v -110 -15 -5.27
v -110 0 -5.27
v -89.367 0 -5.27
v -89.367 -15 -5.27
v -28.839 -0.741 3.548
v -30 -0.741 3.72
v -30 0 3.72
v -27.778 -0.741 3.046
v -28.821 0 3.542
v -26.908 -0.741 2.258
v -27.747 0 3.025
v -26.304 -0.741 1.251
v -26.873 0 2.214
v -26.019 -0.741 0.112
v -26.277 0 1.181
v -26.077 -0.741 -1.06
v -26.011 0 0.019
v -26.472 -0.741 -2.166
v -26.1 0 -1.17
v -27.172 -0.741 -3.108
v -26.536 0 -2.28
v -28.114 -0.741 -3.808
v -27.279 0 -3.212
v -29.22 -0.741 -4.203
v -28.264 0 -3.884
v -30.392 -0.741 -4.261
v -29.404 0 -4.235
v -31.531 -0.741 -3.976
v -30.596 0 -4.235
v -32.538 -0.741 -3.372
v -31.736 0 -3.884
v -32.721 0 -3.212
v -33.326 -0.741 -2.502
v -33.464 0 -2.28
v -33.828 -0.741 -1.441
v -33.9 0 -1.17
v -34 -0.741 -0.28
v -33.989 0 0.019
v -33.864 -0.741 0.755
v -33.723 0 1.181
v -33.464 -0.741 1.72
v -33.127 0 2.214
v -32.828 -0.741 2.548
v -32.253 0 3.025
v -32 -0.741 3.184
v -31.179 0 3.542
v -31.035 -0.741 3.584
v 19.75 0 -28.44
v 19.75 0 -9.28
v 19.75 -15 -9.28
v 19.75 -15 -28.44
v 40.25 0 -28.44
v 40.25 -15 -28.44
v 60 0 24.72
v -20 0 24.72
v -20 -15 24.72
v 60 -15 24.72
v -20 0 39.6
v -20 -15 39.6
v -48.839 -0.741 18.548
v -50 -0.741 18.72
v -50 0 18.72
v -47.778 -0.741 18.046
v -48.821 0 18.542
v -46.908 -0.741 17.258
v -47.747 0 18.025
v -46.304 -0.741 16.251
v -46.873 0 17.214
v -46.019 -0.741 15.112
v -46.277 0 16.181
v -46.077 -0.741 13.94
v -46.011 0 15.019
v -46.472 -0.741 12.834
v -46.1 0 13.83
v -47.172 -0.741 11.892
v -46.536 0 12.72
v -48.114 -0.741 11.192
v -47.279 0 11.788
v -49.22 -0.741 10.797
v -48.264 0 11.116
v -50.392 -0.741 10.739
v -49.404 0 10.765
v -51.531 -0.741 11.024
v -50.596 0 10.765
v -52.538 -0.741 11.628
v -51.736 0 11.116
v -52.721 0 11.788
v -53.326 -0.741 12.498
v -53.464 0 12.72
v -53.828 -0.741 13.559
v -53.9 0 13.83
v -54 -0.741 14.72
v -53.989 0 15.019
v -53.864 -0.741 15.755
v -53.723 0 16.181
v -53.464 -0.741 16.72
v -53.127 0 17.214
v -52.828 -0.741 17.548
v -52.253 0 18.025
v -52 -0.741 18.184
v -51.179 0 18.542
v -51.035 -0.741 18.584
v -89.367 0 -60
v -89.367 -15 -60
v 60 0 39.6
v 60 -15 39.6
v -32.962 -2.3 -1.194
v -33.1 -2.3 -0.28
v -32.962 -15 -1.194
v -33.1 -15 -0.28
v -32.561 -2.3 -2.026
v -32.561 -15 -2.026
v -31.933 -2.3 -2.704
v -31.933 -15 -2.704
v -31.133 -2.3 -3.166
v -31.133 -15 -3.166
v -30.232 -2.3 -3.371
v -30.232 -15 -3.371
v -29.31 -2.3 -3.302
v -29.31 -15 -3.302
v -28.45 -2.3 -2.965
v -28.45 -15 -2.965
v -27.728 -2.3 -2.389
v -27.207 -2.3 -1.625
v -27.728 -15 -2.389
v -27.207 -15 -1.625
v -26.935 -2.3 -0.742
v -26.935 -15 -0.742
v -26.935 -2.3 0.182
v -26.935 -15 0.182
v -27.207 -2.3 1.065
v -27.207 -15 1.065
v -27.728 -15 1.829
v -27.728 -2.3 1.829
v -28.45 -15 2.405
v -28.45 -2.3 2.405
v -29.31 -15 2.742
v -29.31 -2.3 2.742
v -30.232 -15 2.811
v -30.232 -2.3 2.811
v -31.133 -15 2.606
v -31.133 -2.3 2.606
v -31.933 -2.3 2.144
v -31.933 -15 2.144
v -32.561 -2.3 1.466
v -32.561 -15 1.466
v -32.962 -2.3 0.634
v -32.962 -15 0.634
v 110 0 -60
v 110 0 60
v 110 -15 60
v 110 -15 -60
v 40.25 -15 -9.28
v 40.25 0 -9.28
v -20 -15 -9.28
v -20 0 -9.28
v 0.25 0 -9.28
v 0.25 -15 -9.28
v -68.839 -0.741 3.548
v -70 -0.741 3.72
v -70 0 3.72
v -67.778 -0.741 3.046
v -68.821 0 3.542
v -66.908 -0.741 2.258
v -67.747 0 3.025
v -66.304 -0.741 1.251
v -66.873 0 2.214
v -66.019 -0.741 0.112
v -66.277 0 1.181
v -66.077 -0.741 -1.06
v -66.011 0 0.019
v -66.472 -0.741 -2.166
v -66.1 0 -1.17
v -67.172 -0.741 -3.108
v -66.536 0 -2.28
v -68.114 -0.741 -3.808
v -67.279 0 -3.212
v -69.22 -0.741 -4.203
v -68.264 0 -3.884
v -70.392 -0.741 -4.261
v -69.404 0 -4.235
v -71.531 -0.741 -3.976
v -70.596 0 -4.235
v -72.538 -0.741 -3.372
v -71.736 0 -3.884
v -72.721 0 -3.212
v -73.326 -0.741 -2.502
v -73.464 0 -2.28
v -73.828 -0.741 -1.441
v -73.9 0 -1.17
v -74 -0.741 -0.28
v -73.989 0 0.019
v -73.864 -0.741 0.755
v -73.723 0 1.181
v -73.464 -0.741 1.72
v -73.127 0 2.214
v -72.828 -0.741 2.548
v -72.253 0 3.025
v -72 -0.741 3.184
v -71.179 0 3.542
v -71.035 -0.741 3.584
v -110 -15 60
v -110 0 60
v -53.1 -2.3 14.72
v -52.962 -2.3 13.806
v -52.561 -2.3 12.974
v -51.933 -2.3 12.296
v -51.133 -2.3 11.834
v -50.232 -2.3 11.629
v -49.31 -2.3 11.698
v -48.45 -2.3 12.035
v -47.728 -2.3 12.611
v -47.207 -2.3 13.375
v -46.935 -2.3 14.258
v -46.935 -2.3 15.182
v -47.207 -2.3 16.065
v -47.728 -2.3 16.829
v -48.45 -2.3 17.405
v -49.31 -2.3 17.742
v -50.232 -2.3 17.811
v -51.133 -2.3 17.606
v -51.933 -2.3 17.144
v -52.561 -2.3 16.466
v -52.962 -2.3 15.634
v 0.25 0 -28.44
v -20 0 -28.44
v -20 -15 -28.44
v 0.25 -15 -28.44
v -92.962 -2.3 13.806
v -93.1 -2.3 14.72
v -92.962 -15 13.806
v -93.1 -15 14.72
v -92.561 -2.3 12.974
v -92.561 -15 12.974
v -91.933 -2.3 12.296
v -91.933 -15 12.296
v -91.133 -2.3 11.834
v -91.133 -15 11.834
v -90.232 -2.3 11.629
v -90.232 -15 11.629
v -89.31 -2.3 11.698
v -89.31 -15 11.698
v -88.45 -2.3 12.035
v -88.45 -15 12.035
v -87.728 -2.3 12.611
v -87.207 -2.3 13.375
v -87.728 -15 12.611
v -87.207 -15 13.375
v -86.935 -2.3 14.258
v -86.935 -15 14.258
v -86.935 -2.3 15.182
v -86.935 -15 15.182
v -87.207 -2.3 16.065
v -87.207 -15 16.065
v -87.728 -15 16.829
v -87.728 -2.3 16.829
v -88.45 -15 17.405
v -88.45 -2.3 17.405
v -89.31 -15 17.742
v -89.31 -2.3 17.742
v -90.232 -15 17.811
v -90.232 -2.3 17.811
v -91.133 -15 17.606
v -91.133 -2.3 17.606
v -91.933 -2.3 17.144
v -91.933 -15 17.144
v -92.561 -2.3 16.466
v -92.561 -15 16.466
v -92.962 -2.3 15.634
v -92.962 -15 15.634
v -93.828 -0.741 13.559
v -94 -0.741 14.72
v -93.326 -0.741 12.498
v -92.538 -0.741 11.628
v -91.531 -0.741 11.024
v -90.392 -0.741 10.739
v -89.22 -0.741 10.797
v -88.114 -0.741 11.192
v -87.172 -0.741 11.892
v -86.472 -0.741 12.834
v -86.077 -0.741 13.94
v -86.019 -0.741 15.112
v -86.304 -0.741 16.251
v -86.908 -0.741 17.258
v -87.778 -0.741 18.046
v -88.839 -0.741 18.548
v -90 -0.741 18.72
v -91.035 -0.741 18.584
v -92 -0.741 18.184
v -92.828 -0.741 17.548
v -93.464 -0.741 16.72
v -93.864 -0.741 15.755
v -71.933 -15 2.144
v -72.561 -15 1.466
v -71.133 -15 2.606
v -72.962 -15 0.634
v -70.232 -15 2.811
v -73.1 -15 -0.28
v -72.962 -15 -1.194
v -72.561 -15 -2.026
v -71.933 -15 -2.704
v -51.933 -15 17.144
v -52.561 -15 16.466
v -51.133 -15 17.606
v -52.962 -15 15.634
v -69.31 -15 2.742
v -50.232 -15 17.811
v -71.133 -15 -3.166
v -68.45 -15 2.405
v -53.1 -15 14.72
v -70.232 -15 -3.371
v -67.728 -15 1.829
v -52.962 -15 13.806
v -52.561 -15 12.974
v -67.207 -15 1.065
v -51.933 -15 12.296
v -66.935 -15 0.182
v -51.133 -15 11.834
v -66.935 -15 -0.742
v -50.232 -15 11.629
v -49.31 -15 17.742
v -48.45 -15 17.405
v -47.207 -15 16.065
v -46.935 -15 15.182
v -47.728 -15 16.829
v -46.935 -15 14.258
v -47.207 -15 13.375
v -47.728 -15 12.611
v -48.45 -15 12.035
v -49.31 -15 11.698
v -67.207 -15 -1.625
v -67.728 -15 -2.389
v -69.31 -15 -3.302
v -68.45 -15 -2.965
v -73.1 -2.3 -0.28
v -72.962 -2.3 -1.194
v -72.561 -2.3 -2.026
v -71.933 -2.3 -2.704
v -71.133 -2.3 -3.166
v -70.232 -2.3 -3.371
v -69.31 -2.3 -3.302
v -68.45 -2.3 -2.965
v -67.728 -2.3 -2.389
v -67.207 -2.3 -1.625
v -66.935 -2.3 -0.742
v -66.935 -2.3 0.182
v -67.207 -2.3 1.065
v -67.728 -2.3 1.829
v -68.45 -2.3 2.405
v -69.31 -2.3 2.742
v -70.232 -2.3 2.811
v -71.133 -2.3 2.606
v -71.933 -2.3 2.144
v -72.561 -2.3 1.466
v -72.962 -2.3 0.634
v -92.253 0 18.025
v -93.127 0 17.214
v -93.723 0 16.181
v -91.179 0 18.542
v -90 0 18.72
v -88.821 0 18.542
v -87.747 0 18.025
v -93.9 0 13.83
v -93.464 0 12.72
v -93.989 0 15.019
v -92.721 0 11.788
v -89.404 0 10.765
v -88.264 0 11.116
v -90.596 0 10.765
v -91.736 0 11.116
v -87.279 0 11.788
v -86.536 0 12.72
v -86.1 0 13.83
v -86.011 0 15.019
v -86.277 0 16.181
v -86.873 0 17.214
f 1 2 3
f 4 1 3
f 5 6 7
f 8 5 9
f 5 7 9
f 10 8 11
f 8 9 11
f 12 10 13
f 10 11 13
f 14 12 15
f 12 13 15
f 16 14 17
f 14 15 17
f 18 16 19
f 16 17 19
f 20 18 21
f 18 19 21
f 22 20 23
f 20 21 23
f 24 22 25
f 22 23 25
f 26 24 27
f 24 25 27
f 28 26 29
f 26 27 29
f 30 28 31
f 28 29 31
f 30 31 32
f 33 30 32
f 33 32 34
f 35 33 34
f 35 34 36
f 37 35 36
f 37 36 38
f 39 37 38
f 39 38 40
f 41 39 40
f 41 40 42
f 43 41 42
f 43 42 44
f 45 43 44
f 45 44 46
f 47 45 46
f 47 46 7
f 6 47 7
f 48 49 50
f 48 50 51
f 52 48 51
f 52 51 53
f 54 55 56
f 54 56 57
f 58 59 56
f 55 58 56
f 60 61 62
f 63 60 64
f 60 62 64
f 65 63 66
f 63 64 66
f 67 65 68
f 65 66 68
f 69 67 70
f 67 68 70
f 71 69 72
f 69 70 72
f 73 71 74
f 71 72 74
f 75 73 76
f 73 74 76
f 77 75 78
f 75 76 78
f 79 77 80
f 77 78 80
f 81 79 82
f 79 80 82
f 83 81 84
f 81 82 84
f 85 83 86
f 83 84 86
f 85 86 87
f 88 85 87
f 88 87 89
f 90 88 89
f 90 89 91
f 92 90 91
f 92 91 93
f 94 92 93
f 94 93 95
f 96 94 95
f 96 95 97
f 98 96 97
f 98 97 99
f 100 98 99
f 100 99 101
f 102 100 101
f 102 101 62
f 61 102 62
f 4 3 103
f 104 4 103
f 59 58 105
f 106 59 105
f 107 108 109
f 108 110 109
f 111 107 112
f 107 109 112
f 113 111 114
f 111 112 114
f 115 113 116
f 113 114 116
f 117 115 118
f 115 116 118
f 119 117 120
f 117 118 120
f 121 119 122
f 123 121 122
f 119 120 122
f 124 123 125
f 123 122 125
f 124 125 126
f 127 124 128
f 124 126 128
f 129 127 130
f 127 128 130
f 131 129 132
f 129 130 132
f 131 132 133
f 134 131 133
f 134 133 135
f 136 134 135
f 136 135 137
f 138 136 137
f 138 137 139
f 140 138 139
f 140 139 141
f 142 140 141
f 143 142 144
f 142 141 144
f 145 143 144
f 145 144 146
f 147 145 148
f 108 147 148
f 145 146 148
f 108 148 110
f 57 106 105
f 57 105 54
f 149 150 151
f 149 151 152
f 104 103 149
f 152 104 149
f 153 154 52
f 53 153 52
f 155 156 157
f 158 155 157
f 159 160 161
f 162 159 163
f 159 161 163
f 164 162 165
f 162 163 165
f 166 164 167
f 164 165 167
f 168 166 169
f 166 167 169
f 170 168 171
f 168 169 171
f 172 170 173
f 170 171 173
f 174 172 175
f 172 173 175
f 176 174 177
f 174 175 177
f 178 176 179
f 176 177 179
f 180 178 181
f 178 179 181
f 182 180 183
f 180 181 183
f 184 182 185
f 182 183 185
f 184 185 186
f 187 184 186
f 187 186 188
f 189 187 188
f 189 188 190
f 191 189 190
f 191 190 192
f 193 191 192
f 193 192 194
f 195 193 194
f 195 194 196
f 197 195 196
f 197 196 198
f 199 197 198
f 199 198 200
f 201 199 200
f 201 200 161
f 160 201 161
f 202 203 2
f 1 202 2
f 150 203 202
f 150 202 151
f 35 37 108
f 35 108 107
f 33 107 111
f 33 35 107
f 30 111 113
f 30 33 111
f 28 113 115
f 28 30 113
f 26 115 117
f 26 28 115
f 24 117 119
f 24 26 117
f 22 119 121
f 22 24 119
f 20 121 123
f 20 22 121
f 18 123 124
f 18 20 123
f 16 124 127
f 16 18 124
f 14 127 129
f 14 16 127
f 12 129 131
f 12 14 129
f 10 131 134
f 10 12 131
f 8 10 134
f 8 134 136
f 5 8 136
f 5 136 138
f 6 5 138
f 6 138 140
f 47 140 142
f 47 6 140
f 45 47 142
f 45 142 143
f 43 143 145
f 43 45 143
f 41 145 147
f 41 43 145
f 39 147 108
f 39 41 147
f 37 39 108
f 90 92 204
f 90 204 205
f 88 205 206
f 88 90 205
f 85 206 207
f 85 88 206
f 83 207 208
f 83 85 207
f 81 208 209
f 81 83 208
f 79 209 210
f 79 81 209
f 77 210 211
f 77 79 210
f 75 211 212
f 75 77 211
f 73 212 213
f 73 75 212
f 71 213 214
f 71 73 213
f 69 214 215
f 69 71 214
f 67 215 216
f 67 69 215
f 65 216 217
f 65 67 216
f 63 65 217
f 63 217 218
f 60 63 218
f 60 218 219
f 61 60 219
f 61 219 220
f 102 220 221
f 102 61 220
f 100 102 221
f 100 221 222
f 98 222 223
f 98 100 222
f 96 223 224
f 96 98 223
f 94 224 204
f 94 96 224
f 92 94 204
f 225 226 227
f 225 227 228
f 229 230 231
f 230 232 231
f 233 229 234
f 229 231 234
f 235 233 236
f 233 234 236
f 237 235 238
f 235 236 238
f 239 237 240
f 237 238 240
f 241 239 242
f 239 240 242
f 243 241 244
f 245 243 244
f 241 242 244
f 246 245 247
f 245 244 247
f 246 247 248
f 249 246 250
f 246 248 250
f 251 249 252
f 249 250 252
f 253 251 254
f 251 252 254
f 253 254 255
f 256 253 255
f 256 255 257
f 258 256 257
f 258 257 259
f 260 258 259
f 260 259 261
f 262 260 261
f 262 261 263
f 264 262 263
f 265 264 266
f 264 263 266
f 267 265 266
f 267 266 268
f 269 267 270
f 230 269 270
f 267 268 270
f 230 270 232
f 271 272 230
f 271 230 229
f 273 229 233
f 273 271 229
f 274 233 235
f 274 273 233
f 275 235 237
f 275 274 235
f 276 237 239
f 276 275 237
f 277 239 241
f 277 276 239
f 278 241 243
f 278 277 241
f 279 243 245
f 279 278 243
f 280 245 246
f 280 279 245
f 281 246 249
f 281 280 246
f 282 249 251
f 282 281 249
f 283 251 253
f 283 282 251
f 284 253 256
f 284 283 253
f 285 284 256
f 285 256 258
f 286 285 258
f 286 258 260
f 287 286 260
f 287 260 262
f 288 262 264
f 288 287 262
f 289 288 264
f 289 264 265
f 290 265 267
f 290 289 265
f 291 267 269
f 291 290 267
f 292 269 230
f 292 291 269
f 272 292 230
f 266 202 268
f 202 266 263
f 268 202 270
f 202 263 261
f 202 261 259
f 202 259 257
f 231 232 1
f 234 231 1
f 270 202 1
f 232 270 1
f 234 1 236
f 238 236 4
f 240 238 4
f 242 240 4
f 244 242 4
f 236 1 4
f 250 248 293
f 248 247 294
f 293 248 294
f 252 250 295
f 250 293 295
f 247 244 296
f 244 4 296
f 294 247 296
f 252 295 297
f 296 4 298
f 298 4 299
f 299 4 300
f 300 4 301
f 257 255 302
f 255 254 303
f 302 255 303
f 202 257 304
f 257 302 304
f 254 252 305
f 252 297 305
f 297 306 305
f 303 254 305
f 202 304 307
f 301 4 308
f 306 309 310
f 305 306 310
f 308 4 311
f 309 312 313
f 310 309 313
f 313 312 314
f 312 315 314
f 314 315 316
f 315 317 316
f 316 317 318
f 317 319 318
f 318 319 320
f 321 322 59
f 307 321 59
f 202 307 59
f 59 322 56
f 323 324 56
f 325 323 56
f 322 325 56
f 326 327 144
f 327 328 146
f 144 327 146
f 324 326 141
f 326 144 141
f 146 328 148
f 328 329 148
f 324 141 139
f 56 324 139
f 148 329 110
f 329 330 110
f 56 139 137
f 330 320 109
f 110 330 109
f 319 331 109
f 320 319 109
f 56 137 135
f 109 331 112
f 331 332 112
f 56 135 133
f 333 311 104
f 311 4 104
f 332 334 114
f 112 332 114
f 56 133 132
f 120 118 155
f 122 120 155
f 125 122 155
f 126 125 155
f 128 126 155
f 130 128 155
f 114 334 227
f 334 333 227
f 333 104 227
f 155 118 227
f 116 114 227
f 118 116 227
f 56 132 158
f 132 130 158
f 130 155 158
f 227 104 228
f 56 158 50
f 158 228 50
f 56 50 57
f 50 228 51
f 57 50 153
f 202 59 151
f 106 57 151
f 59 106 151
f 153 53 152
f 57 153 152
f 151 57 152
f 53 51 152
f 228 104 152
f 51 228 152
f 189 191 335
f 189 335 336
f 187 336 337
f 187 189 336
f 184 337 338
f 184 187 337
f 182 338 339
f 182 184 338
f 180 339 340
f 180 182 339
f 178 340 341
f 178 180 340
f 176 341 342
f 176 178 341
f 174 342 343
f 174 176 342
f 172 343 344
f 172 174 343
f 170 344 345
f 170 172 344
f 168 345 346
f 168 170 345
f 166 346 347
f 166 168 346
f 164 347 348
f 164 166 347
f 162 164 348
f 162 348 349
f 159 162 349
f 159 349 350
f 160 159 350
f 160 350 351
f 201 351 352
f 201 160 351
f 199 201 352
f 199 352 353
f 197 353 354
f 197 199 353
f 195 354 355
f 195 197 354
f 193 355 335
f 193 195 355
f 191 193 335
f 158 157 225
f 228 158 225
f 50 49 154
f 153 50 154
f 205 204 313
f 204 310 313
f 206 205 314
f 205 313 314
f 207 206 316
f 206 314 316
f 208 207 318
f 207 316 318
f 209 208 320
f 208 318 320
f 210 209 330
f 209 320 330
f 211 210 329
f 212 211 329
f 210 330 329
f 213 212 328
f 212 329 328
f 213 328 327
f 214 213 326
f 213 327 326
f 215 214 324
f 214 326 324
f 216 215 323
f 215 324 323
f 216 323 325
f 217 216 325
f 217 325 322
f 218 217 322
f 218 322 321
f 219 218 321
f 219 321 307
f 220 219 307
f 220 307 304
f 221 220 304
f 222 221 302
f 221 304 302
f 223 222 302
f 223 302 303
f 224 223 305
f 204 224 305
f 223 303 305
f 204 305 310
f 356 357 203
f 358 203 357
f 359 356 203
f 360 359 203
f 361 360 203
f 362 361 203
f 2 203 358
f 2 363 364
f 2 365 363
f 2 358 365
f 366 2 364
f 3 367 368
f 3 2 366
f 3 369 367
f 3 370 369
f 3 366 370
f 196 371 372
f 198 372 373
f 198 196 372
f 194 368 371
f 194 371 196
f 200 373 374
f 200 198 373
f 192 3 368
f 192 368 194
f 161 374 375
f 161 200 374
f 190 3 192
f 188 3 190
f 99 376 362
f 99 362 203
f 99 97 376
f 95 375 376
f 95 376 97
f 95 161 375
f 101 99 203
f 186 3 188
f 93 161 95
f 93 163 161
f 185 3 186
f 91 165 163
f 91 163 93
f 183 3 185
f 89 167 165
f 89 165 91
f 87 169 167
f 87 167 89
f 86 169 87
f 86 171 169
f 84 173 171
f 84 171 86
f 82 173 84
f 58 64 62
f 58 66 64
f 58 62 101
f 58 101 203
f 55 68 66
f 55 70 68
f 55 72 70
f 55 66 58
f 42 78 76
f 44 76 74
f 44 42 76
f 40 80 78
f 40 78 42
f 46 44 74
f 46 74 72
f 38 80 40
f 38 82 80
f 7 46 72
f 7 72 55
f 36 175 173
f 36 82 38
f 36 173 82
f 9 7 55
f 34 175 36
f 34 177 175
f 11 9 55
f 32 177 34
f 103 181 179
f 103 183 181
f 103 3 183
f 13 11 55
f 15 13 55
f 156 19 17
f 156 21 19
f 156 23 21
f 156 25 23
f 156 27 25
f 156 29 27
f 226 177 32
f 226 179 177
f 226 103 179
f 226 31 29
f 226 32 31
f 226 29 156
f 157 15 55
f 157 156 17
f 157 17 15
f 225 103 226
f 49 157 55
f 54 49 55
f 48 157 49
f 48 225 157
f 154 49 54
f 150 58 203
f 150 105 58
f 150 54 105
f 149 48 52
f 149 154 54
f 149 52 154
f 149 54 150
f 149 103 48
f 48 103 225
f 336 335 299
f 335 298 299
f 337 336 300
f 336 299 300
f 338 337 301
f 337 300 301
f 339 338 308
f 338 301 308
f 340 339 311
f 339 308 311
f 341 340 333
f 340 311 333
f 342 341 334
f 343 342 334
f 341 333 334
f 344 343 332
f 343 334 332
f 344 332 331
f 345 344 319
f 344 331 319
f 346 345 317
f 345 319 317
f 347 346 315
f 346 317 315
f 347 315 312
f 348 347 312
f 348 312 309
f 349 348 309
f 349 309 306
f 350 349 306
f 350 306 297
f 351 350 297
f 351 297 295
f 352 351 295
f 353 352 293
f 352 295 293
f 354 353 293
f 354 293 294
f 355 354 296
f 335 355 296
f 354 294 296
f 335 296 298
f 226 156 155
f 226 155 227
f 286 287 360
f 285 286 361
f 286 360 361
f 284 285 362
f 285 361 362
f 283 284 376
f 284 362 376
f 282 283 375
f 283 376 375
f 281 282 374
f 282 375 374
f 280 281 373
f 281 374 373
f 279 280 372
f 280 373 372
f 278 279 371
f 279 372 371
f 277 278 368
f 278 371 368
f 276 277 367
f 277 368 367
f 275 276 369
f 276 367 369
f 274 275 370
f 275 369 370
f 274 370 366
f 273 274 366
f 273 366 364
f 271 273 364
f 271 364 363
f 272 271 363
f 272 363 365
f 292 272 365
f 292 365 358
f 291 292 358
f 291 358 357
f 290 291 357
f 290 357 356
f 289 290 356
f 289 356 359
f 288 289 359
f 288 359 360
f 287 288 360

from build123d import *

# Parameters (mm, degrees)
SKETCH1_W                  = 220
SKETCH1_H                  = 120
BOSS_EXTRUDE1_DEPTH        = 15
CUT_EXTRUDE1_REACH         = 128.194
SKETCH2_W                  = 20.632503002
SKETCH2_H                  = 54.730004003
CUT_EXTRUDE2_REACH         = 128.194
SKETCH3_W                  = 20.25
SKETCH3_H                  = 19.16
SKETCH3_W_2                = 20.5
CUT_EXTRUDE3_REACH         = 128.194
SKETCH4_W                  = 80
SKETCH4_H                  = 14.88
F_6_2_6_2_DIAMETER_HOLE1_D = 6.2
SKETCH8_R                  = 4
CUT_EXTRUDE4_DEPTH         = 0.5
CHAMFER1_SIZE              = 1.8
CHAMFER1_SIZE_2            = 1.039230485


with BuildPart() as part:
    # Sketch1 → Boss-Extrude1 (new body)
    with BuildSketch(Plane(origin=(0, 0, 0), x_dir=(1, 0, 0), z_dir=(0, 1, 0))):
        Rectangle(SKETCH1_W, SKETCH1_H)
    extrude(amount=-BOSS_EXTRUDE1_DEPTH)

    # Sketch2 → Cut-Extrude1 (cut, up to next)
    with BuildSketch(Plane(origin=(0, 0, 0), x_dir=(1, 0, 0), z_dir=(0, 1, 0)), mode=Mode.PRIVATE) as cut_extrude1_sk1:
        with Locations((-99.683748499, 32.634997999)):
            Rectangle(SKETCH2_W, SKETCH2_H)
    cut_extrude1_tool1 = extrude(cut_extrude1_sk1.sketch, amount=-CUT_EXTRUDE1_REACH, mode=Mode.PRIVATE) & part.part
    add(cut_extrude1_tool1.solids().sort_by_distance((-99.683748, 0, -32.634998))[0], mode=Mode.SUBTRACT)

    # Sketch3 → Cut-Extrude2 (cut, up to next)
    with BuildSketch(Plane(origin=(0, 0, 0), x_dir=(1, 0, 0), z_dir=(0, 1, 0)), mode=Mode.PRIVATE) as cut_extrude2_sk1:
        with Locations((-9.875, 18.86)):
            Rectangle(SKETCH3_W, SKETCH3_H)
    cut_extrude2_tool1 = extrude(cut_extrude2_sk1.sketch, amount=-CUT_EXTRUDE2_REACH, mode=Mode.PRIVATE) & part.part
    # Sketch3 → Cut-Extrude2 (cut, up to next)
    with BuildSketch(Plane(origin=(0, 0, 0), x_dir=(1, 0, 0), z_dir=(0, 1, 0)), mode=Mode.PRIVATE) as cut_extrude2_sk2:
        with Locations((30, 18.86)):
            Rectangle(SKETCH3_W_2, SKETCH3_H)
    cut_extrude2_tool2 = extrude(cut_extrude2_sk2.sketch, amount=-CUT_EXTRUDE2_REACH, mode=Mode.PRIVATE) & part.part
    add(cut_extrude2_tool1.solids().sort_by_distance((-9.875, 0, -18.86))[0], mode=Mode.SUBTRACT)
    add(cut_extrude2_tool2.solids().sort_by_distance((30, 0, -18.86))[0], mode=Mode.SUBTRACT)

    # Sketch4 → Cut-Extrude3 (cut, up to next)
    with BuildSketch(Plane(origin=(0, 0, 0), x_dir=(1, 0, 0), z_dir=(0, 1, 0)), mode=Mode.PRIVATE) as cut_extrude3_sk1:
        with Locations((20, -32.16)):
            Rectangle(SKETCH4_W, SKETCH4_H)
    cut_extrude3_tool1 = extrude(cut_extrude3_sk1.sketch, amount=-CUT_EXTRUDE3_REACH, mode=Mode.PRIVATE) & part.part
    add(cut_extrude3_tool1.solids().sort_by_distance((20, 0, 32.16))[0], mode=Mode.SUBTRACT)

    # Ø6.2 (6.2) Diameter Hole1 (through all)
    with Locations(Plane(origin=(0, 0, 0), x_dir=(1, 0, 0), z_dir=(0, 1, 0))):
        with Locations((-30, 0.28), (-50, -14.72), (-70, 0.28), (-90, -14.72)):
            Hole(F_6_2_6_2_DIAMETER_HOLE1_D / 2)

    # Sketch8 → Cut-Extrude4 (cut)
    with BuildSketch(Plane(origin=(0, 0, 0), x_dir=(1, 0, 0), z_dir=(0, 1, 0))):
        with Locations(Location((-90, -14.72, 0), (0, 0, 270))):
            Circle(SKETCH8_R)
        with Locations(Location((-70, 0.28, 0), (0, 0, 270))):
            Circle(SKETCH8_R)
        with Locations(Location((-50, -14.72, 0), (0, 0, 270))):
            Circle(SKETCH8_R)
        with Locations(Location((-30, 0.28, 0), (0, 0, 270))):
            Circle(SKETCH8_R)
    extrude(amount=-CUT_EXTRUDE4_DEPTH, mode=Mode.SUBTRACT)

    # Chamfer1
    # the kernel refuses this chamfer: 1.8, 1.039230485 mm, written as the material it takes off along each edge
    with BuildSketch(Plane(origin=(-90, -0.5, 14.72), x_dir=(-1, 0, 0), z_dir=(0, 0, 1))) as chamfer1_piece_1_section:
        Polygon((3.1, CHAMFER1_SIZE), (3.1 + CHAMFER1_SIZE_2, 0), (3.1, 0), align=None)
    chamfer1_piece_1 = revolve(axis=Axis((-90, -0.5, 14.72), (0, -1, 0)), mode=Mode.PRIVATE)
    chamfer1_piece_1 = chamfer1_piece_1 & Plane(origin=(-90, -1.537716701, 14.72), x_dir=(0, 0, 1), z_dir=(0, 1, 0)) * Cylinder(4, 17, mode=Mode.PRIVATE)
    add(chamfer1_piece_1, mode=Mode.SUBTRACT)
    with BuildSketch(Plane(origin=(-30, -0.5, -0.28), x_dir=(-1, 0, 0), z_dir=(0, 0, 1))) as chamfer1_piece_2_section:
        Polygon((3.1, CHAMFER1_SIZE), (3.1 + CHAMFER1_SIZE_2, 0), (3.1, 0), align=None)
    chamfer1_piece_2 = revolve(axis=Axis((-30, -0.5, -0.28), (0, -1, 0)), mode=Mode.PRIVATE)
    chamfer1_piece_2 = chamfer1_piece_2 & Plane(origin=(-30, -1.537716701, -0.28), x_dir=(0, 0, 1), z_dir=(0, 1, 0)) * Cylinder(4, 17, mode=Mode.PRIVATE)
    add(chamfer1_piece_2, mode=Mode.SUBTRACT)
    with BuildSketch(Plane(origin=(-50, -0.5, 14.72), x_dir=(-1, 0, 0), z_dir=(0, 0, 1))) as chamfer1_piece_3_section:
        Polygon((3.1, CHAMFER1_SIZE), (3.1 + CHAMFER1_SIZE_2, 0), (3.1, 0), align=None)
    chamfer1_piece_3 = revolve(axis=Axis((-50, -0.5, 14.72), (0, -1, 0)), mode=Mode.PRIVATE)
    chamfer1_piece_3 = chamfer1_piece_3 & Plane(origin=(-50, -1.537716701, 14.72), x_dir=(0, 0, 1), z_dir=(0, 1, 0)) * Cylinder(4, 17, mode=Mode.PRIVATE)
    add(chamfer1_piece_3, mode=Mode.SUBTRACT)
    with BuildSketch(Plane(origin=(-70, -0.5, -0.28), x_dir=(-1, 0, 0), z_dir=(0, 0, 1))) as chamfer1_piece_4_section:
        Polygon((3.1, CHAMFER1_SIZE), (3.1 + CHAMFER1_SIZE_2, 0), (3.1, 0), align=None)
    chamfer1_piece_4 = revolve(axis=Axis((-70, -0.5, -0.28), (0, -1, 0)), mode=Mode.PRIVATE)
    chamfer1_piece_4 = chamfer1_piece_4 & Plane(origin=(-70, -1.537716701, -0.28), x_dir=(0, 0, 1), z_dir=(0, 1, 0)) * Cylinder(4, 17, mode=Mode.PRIVATE)
    add(chamfer1_piece_4, mode=Mode.SUBTRACT)


solid = part.part
